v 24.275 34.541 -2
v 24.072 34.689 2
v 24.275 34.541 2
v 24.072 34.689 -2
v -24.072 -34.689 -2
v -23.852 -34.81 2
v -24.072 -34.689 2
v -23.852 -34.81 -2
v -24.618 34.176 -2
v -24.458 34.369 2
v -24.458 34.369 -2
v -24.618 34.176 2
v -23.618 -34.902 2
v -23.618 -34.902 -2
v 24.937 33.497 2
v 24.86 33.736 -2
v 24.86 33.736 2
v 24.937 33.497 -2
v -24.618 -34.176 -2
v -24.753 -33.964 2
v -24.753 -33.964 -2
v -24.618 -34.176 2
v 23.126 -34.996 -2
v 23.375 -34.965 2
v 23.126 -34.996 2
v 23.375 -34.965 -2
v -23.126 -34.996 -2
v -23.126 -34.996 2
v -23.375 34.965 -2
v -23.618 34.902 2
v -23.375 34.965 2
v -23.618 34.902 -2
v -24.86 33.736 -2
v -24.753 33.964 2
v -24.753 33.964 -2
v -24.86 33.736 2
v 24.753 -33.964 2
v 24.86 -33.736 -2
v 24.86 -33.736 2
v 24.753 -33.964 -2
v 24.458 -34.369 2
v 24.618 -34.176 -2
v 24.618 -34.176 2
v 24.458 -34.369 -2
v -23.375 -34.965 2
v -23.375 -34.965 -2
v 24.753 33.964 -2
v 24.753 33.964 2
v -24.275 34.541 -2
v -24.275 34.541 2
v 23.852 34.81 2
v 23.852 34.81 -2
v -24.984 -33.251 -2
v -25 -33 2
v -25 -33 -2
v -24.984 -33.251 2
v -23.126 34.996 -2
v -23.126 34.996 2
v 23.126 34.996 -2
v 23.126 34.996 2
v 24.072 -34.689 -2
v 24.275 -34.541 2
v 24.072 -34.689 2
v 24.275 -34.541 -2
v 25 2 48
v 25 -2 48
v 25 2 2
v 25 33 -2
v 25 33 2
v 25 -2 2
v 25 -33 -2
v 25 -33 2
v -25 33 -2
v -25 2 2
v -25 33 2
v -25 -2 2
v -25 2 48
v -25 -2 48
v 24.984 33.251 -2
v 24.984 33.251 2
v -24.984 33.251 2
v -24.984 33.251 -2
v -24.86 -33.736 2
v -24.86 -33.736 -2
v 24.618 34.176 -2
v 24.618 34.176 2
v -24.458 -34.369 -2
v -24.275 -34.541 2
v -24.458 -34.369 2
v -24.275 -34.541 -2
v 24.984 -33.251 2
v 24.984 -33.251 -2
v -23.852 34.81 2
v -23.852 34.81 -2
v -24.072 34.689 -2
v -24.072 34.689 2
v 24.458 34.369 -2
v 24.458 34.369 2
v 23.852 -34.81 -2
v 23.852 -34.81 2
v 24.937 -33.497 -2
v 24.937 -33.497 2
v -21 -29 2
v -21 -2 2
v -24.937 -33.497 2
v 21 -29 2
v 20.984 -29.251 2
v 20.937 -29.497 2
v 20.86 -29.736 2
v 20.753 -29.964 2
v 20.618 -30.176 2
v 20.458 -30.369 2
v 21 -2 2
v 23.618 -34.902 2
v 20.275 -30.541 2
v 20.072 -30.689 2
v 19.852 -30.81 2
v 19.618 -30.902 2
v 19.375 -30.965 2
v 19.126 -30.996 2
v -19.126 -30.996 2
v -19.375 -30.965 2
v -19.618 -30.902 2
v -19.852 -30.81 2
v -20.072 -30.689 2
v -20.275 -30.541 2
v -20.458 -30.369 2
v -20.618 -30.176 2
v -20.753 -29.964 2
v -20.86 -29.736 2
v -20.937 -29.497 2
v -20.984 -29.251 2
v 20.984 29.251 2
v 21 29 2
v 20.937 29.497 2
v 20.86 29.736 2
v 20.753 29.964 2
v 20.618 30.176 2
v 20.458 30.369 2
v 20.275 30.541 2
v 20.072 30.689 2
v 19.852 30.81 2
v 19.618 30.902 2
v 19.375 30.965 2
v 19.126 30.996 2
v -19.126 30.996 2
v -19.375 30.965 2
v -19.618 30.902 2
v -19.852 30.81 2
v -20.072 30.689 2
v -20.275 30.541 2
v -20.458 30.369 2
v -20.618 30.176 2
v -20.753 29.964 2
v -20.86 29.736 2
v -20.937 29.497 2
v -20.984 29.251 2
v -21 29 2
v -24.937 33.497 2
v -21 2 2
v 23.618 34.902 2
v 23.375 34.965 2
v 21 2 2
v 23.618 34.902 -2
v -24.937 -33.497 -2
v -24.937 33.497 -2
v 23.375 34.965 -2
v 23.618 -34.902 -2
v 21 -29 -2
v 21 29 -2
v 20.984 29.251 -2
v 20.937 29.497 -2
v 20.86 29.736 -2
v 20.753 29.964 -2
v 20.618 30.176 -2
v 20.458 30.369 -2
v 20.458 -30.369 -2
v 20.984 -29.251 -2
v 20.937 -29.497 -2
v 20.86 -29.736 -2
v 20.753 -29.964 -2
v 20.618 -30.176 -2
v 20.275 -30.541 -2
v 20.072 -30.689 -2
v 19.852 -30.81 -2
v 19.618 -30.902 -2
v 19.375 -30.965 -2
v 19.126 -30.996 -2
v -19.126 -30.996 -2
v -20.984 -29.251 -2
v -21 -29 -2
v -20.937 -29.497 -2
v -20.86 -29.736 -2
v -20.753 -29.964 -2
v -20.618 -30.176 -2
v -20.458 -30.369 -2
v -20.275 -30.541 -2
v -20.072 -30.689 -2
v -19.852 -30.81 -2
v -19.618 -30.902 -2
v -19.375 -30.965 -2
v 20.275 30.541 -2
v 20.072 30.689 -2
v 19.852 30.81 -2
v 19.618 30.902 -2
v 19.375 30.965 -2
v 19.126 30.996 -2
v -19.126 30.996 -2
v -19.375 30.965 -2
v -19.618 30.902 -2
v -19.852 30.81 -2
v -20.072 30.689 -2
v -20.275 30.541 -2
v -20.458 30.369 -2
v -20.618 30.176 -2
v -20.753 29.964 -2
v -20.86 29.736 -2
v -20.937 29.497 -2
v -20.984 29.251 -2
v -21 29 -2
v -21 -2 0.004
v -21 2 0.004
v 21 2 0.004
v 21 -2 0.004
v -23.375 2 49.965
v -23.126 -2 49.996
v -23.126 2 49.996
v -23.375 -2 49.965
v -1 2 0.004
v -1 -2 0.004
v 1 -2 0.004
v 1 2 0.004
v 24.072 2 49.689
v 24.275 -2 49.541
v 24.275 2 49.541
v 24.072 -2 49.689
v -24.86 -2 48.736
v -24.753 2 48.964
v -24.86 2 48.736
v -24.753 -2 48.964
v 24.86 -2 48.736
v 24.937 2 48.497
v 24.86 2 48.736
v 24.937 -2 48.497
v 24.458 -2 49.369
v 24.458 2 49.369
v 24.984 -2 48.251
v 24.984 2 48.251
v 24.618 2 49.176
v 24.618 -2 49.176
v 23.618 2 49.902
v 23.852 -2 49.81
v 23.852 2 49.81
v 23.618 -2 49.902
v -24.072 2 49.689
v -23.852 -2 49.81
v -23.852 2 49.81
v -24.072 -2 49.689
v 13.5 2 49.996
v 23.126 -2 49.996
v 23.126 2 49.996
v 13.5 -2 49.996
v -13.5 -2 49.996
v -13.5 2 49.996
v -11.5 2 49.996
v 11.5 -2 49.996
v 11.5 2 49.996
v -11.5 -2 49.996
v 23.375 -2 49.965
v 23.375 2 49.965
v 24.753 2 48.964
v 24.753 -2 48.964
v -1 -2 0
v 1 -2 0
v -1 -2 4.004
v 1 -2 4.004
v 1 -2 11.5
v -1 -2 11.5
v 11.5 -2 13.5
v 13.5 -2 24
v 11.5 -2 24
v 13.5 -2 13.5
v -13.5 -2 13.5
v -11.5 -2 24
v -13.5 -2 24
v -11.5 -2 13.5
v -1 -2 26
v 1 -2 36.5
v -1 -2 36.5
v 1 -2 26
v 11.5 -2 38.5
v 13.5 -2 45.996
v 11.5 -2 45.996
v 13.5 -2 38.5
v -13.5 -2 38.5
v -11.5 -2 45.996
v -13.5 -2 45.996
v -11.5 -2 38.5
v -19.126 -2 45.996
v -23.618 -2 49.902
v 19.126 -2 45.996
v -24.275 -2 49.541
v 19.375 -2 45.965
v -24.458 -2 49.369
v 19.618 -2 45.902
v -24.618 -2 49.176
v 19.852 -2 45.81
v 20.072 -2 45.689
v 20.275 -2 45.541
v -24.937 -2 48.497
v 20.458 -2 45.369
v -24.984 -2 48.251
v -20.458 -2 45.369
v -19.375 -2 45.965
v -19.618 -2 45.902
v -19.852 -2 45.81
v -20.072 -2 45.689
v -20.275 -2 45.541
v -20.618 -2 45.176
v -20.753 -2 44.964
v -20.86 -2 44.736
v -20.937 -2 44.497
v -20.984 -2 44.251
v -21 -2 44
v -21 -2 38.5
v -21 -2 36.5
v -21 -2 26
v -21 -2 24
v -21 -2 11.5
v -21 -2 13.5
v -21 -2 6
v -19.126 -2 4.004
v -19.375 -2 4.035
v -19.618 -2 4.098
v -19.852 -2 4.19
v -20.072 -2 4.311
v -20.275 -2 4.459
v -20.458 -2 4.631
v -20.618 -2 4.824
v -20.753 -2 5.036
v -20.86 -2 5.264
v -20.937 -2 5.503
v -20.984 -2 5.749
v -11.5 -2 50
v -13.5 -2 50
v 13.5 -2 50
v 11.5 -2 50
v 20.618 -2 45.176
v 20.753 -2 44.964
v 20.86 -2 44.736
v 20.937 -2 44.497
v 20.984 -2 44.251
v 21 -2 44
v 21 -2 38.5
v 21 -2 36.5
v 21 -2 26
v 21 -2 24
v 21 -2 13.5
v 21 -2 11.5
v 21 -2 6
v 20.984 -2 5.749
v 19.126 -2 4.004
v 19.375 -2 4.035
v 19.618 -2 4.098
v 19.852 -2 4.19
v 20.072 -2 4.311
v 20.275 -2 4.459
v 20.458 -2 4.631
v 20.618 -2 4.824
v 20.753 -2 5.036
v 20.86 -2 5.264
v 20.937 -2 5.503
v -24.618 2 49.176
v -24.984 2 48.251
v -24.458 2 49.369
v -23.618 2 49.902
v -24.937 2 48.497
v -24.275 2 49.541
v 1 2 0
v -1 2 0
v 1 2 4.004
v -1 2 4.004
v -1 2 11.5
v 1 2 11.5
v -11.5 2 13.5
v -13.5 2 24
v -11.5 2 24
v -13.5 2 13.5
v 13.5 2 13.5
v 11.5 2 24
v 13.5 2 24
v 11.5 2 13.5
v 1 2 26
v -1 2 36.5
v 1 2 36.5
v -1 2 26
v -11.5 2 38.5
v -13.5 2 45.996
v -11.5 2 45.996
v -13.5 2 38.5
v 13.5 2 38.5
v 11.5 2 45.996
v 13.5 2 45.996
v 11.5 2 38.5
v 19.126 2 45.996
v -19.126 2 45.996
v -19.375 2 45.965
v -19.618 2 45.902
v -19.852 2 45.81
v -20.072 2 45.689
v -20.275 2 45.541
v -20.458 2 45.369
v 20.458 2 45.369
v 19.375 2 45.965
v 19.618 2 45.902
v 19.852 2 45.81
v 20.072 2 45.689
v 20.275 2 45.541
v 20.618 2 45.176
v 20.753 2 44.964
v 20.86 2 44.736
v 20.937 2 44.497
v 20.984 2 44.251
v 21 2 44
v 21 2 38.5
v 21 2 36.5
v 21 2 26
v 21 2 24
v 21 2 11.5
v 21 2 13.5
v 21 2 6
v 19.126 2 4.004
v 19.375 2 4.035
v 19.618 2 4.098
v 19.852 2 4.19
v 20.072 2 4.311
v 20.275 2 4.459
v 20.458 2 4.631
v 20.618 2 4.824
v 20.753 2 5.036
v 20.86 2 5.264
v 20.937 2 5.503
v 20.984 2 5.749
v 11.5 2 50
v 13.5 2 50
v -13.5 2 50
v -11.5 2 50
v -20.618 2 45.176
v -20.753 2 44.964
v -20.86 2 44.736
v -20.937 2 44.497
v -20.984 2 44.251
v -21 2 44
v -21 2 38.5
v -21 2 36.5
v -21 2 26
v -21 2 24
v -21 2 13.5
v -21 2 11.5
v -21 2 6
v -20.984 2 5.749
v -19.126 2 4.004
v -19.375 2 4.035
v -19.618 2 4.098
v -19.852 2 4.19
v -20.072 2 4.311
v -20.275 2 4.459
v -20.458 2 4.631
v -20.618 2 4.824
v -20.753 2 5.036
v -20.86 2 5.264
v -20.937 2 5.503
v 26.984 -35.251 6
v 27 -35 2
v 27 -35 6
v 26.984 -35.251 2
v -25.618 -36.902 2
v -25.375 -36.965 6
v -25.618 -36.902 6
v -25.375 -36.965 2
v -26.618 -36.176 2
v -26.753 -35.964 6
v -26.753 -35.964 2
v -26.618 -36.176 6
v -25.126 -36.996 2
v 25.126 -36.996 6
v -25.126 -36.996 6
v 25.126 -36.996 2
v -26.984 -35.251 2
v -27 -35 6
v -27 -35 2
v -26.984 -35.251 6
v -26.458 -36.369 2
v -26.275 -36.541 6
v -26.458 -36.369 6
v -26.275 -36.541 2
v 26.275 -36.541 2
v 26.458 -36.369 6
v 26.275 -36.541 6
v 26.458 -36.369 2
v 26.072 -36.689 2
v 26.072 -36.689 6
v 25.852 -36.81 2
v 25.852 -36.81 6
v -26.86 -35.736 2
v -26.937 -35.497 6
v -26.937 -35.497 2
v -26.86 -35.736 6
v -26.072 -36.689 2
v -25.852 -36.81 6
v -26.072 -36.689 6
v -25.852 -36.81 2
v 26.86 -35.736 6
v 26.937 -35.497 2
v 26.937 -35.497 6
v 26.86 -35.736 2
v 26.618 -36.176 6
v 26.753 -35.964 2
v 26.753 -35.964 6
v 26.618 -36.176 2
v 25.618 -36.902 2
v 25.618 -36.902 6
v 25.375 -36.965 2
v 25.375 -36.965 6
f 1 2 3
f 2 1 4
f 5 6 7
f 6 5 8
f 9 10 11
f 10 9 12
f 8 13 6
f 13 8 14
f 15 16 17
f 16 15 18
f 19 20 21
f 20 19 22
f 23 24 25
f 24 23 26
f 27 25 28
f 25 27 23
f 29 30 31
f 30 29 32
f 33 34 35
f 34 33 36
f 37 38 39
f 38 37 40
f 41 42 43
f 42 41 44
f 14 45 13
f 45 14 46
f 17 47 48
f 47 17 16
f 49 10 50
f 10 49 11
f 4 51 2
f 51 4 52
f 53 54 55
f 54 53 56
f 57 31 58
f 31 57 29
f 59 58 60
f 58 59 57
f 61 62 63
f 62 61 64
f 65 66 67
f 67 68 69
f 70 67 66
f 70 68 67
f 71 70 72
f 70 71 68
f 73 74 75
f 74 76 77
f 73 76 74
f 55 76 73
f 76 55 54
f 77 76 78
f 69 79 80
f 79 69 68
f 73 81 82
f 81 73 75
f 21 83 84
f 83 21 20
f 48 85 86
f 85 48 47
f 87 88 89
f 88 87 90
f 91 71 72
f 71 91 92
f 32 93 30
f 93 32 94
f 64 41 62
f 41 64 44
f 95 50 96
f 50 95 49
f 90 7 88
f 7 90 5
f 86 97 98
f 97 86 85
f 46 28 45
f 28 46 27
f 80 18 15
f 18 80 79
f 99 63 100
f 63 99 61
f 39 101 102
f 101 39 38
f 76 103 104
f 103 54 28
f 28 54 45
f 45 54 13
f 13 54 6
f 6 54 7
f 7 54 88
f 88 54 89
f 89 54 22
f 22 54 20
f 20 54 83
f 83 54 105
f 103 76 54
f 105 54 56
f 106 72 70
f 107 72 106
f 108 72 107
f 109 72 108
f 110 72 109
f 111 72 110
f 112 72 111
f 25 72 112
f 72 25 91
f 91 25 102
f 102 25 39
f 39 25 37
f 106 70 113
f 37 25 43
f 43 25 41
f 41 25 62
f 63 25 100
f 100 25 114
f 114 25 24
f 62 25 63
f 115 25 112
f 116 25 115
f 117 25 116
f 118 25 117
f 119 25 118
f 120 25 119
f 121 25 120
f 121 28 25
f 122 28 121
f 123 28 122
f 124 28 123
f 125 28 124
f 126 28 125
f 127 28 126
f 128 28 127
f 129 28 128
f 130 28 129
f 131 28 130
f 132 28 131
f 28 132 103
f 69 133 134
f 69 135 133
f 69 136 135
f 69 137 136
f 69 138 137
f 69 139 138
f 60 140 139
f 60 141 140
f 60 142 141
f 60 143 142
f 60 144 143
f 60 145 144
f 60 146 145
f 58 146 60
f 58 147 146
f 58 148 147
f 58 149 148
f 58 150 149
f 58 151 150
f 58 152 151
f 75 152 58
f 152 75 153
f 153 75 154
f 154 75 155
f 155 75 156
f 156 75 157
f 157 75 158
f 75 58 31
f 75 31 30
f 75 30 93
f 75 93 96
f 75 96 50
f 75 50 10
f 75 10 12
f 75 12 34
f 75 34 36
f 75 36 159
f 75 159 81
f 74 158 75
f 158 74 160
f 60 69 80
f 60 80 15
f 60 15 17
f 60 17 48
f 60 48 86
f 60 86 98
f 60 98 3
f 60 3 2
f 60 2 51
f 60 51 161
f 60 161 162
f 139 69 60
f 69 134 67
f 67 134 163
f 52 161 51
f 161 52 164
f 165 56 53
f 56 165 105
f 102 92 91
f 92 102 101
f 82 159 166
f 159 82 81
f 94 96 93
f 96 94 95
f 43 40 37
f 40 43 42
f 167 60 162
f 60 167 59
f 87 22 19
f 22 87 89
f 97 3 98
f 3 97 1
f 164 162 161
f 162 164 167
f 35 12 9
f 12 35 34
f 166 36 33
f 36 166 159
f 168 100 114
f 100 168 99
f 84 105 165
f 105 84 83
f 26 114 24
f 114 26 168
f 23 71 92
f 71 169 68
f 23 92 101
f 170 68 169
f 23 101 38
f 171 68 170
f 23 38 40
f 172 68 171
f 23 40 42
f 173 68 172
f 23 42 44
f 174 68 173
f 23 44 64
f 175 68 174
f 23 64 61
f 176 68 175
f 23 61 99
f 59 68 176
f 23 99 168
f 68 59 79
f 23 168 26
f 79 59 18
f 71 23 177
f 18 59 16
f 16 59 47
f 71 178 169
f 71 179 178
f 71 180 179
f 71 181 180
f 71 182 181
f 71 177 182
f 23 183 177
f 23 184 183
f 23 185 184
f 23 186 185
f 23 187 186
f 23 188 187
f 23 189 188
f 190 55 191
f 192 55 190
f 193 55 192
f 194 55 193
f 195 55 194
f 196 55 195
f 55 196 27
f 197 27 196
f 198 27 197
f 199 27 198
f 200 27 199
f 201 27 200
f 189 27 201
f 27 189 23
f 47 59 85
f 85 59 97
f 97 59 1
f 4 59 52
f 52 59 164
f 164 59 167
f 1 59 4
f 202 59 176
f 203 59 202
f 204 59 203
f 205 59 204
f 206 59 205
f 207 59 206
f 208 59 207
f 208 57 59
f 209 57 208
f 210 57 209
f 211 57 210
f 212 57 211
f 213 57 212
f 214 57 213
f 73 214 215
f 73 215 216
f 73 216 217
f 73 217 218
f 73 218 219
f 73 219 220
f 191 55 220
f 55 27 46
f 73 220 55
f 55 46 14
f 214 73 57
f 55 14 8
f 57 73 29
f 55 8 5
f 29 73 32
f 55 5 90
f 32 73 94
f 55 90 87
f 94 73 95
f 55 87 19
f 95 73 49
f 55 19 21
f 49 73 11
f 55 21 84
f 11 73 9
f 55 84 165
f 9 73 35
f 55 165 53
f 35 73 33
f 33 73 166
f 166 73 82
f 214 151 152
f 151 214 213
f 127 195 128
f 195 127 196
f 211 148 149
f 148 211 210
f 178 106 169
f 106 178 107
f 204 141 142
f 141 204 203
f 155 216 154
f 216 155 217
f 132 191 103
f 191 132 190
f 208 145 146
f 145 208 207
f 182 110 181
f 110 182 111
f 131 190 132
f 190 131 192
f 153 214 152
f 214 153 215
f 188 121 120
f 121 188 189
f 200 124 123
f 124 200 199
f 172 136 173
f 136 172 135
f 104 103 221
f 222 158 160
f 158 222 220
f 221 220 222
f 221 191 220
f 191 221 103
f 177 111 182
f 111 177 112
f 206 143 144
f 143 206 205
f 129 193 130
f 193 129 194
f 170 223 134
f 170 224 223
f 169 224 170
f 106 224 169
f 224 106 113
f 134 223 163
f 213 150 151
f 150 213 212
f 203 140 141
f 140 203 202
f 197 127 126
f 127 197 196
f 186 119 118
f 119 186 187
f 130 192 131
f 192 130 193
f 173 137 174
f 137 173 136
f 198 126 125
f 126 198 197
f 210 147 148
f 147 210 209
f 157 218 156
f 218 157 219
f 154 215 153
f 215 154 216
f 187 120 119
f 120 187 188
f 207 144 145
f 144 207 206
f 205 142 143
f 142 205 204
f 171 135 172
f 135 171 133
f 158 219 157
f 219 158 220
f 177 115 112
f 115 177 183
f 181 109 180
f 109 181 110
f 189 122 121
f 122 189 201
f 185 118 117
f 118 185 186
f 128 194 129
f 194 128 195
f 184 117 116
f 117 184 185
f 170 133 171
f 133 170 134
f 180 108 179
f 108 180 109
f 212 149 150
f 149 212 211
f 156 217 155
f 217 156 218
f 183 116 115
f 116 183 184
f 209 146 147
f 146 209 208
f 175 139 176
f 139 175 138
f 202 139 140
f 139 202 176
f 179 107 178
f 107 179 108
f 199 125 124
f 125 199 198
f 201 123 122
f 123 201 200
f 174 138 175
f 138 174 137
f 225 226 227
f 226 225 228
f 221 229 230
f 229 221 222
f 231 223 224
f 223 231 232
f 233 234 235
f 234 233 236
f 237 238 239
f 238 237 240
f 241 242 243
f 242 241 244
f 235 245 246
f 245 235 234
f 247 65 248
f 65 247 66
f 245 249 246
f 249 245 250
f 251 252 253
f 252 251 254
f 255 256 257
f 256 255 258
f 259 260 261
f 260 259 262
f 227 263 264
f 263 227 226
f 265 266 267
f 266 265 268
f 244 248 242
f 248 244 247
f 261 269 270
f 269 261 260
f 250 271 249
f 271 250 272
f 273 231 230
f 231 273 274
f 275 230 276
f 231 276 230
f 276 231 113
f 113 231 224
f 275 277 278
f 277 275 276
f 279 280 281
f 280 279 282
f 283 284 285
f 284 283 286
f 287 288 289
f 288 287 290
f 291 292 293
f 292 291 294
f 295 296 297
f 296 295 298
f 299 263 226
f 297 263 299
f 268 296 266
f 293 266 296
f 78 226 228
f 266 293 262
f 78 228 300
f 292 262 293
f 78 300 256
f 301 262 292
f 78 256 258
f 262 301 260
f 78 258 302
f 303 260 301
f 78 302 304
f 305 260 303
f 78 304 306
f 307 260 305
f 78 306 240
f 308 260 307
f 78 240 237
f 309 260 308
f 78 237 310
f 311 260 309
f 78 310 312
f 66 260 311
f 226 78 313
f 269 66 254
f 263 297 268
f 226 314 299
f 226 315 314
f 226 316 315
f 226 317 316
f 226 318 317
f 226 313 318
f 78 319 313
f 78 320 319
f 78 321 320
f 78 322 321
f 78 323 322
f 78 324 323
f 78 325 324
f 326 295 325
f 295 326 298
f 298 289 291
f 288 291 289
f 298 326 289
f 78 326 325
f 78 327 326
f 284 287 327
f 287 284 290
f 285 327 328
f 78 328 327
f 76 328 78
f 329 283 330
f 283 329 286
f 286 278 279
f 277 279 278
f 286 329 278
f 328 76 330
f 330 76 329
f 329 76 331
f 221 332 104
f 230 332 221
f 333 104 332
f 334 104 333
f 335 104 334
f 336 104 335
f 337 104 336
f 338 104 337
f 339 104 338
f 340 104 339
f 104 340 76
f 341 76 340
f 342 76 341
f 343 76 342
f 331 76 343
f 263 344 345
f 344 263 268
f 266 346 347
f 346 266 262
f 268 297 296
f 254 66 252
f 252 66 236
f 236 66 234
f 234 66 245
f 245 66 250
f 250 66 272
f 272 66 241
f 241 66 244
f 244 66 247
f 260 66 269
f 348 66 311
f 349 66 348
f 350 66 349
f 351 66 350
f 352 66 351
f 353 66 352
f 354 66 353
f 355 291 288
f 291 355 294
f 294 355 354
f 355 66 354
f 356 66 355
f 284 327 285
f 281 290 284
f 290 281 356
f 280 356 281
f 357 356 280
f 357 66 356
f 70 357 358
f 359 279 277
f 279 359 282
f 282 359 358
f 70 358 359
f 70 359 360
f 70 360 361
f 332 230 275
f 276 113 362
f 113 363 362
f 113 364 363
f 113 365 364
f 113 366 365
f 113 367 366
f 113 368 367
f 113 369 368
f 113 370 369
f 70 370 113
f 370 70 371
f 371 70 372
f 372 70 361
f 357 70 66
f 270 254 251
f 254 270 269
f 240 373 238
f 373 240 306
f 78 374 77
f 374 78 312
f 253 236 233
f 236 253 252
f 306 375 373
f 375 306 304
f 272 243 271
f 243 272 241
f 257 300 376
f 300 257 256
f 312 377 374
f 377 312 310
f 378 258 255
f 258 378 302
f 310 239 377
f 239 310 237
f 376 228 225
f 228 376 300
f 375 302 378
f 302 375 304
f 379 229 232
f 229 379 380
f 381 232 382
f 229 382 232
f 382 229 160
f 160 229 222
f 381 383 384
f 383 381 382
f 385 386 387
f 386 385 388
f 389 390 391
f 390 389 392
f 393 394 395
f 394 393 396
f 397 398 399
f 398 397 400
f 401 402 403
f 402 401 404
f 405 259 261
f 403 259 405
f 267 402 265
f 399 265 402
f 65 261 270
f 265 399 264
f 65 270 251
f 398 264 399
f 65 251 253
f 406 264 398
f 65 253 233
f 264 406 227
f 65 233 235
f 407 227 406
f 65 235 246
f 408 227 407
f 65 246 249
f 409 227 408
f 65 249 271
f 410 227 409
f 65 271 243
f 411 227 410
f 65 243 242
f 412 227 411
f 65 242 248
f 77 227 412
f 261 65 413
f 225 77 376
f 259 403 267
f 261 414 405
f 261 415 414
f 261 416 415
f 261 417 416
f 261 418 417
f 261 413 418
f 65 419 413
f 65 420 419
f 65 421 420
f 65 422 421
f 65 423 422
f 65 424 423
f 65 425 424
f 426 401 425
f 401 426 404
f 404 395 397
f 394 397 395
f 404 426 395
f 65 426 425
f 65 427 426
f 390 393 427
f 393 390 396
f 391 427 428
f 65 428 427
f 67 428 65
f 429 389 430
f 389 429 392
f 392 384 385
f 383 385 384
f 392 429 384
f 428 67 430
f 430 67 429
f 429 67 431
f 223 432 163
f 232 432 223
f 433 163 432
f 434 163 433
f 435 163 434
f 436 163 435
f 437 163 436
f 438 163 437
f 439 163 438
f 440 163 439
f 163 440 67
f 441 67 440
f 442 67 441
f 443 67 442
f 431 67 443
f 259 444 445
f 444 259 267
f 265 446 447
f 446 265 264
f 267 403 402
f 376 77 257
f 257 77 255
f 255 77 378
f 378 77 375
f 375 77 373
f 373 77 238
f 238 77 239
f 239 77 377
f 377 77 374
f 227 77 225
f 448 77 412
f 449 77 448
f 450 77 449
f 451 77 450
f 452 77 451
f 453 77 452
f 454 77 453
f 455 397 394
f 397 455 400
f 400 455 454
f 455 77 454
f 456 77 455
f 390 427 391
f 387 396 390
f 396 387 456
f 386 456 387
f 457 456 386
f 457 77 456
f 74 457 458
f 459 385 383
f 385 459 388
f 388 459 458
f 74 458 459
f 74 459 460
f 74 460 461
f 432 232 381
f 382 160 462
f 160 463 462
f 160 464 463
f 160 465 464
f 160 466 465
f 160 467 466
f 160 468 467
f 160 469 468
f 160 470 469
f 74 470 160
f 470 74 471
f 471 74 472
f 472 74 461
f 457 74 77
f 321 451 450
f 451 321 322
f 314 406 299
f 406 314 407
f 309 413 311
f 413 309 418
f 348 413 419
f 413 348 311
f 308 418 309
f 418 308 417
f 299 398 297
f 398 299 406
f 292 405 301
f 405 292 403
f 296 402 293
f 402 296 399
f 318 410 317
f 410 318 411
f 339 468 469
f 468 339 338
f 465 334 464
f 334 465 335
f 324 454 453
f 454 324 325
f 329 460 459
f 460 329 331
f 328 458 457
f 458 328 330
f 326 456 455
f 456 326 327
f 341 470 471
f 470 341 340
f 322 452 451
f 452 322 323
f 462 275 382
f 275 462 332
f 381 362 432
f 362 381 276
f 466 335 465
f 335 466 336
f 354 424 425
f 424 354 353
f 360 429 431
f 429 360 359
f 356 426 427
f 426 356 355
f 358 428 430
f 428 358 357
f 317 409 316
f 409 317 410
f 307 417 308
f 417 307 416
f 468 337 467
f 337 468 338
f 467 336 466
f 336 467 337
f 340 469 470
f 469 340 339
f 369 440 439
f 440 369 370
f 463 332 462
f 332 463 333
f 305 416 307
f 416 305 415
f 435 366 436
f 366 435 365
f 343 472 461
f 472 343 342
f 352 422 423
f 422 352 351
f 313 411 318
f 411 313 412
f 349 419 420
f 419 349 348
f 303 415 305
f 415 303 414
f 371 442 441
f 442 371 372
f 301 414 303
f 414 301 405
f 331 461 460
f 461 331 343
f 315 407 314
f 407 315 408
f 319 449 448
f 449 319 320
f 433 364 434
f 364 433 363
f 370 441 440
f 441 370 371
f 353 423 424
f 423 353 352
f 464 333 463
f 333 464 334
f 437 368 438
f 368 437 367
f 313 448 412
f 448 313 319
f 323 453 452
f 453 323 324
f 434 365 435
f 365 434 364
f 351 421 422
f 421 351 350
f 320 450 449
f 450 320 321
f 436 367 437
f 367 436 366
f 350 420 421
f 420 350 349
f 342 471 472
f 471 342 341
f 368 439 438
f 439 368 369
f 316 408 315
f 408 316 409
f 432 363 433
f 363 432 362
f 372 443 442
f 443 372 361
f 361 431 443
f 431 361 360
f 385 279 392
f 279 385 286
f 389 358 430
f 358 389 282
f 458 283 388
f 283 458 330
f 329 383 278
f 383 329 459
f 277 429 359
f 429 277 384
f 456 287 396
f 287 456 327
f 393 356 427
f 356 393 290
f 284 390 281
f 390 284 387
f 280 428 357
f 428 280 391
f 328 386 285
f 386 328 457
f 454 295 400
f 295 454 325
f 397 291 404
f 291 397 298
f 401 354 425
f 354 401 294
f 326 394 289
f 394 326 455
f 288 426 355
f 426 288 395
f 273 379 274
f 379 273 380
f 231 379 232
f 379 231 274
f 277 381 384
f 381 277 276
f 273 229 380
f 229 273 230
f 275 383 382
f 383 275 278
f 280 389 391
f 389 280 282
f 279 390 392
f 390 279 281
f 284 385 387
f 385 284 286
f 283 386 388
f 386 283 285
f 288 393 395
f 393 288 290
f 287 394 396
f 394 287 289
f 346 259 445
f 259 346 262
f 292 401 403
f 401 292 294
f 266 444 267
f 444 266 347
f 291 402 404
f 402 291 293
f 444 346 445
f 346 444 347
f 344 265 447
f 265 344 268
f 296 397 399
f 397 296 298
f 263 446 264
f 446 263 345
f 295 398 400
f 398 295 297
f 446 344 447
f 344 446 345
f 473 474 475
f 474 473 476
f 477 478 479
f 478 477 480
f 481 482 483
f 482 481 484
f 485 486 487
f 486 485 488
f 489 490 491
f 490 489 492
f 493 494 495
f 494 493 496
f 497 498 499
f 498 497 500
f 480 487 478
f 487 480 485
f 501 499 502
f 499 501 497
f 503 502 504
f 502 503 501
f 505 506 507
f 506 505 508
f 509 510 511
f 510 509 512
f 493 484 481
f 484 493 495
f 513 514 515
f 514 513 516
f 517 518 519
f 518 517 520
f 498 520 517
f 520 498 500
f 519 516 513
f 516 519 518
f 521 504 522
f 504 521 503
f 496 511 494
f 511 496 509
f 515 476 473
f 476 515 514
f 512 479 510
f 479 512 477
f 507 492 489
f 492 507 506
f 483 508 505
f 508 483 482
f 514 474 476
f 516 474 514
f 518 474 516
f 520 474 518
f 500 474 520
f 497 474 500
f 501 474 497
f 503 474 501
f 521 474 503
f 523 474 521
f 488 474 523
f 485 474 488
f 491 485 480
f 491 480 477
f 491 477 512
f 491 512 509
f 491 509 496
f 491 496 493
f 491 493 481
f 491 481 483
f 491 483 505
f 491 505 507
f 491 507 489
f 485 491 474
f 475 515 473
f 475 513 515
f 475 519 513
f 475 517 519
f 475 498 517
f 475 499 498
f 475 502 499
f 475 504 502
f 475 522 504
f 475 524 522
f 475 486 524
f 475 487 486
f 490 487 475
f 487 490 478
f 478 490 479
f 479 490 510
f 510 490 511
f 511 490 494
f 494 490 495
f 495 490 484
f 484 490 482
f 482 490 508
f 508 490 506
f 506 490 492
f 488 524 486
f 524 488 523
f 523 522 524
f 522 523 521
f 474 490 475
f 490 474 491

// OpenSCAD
// file: utils.scad
// Cube with rounded corners
// roundedCornerCube (50,50,4);
module roundedCornerCube(length, width, thickness){

        hull()
        {
            translate([length/2 - 2, width/2 - 2, 0]) cylinder(r=2, h=thickness, $fn=50, center=true);
            translate([length/2 - 2, -width/2 + 2, 0]) cylinder(r=2, h=thickness, $fn=50, center=true);
            translate([-length/2 + 2, width/2 - 2, 0]) cylinder(r=2, h=thickness, $fn=50, center=true);
            translate([-length/2 + 2, -width/2 + 2, 0]) cylinder(r=2, h=thickness, $fn=50, center=true);
        }

}

// Hollow cube with rounded corners. Will look like a frame with rounded con
// hollowRoundedCornerCube(50,70,4,2);
module hollowRoundedCornerCube(length, width, thickness, wallthickness)
{
    difference()
    {
        roundedCornerCube(length,width,thickness);
        roundedCornerCube(length-(wallthickness*2),width-(wallthickness*2),thickness);
    }
}

/*
module cylinderWithHandle(radius, thickness)
{
    rotate_extrude($fn=100)
        polygon( points = [[0,0], [radius,0], [radius,thickness] , [1,thickness], [2,thickness + 2] , [2,thickness + 6],[0,thickness + 6]] );
}
*/


// hollow cylinder
// hollowCylinder(radius, height, wallThickness)
// radius : radius to outter wall
// wallThickness : Thickness of wall
module hollowCylinder(radius, height, wallThickness)
{

    difference()
    {
        cylinder(h=height, r1=radius, r2=radius);
        translate([0,0,-.02]) cylinder(h=height + .04, r1=radius - wallThickness, r2=radius - wallThickness);
    }
}


// hollow cylinders
// hollowCylinders(20, 10, 2, 2, 2)
// radius : radius to outer wall
// gapsSize : size of gap between each rings
// minradius : radius of the smallest ring
module hollowCylinders(radius, height, wallThickness, gapSize, minRadius)
{
    for (i = [radius : -(gapSize + wallThickness) : minRadius])
    {
       //echo (i);
       hollowCylinder(i,height,wallThickness);
    }
}

//
// b = bottom diameter
// t = top diameter
// h = height
module cone(b, t, h)
{
    cylinder(h=h, r1=b/2, r2=t/2, $fn=100);
}

// hollowCone(10,4,20, 2)
module hollowCone(bottomRadius, topRadius, height, wallThickness)
{
    difference()
    {
        cylinder(h=height, r1=bottomRadius, r2=topRadius, $fn=100);
        translate([0,0,-.02]) cylinder(h=height, r1=bottomRadius - wallThickness, r2=topRadius - wallThickness, $fn=100);
    }
}


// w = width between flat surface
// h = height
module hex (w=10, h=2){
  cylinder (r=w/2, h=h, center=true, $fn=6);
}

// hollowCone(10,4,20, 2)
module hollowHex(w=10, h=2, th=2)
{
    difference()
    {
        cylinder (r=w/2, h=h, center=true, $fn=6);
        cylinder (r=w/2 - th, h=h, center=true, $fn=6);
    }
}

// h : height
// ns : number of sides for base
// br : bottom radius
// tr : top radius
// ro : rotation in degree between bottom and top
// sl : slice layer. high value give smooth appearence
module twistExtrude(h=50,ns=6,br=20,tr=20,ro=100,sl=5)
{

	linear_extrude(height = h, twist  = ro,	slices = sl, scale  = tr/br)
		circle(r=br, $fn=ns);
}


// h : height
// ns : number of sides for base
// br : bottom radius
// tr : top radius
// ro : rotation in degree between bottom and top
// sl : slice layer. high value give smooth appearence
// wt : wall thickness
module hollowTwistExtrude(h=50,ns=6,br=20,tr=20,ro=100,sl=5,wt=1)
{
	difference()
	{
		linear_extrude(height = h, twist  = ro,	slices = sl, scale  = tr/br)
			circle(r=br, $fn=ns);

    translate([0,0,-.01])
		linear_extrude(height = h + .1, twist  = ro,	slices = sl, scale  = tr/br)
			circle(r=br - wt, $fn=ns);
	}
}


///////////////////////////////////////////////////////////////////////////////////////////////////////////////////

// honeycomb tiles
// honeycombSquare(100,100,4,10,2);
module honeycombTiles(length, width,thickness,rad,wallThickness)
{
    //thickness = 4;
    //rad = 10;
    //wallThickness = 2;
    //length = 100;
    //width = 100;

    for (w=[0: width/rad])
    {

        if (w % 2 == 0)
        {
            //cylinder($fn=6, r=rad, h=2);
            for (i = [0 : length/((rad*2) + (wallThickness*2))])
            {
              translate([rad*(3*i) + (wallThickness*2)*i,w*rad,0]) cylinder($fn=6, r=rad, h=thickness);

              //translate([rad*6 + (wallThickness*2)*2,0,0]) cylinder($fn=6, r=10, h=2);
              //translate([rad*9 + (wallThickness*2)*3,0,0]) cylinder($fn=6, r=10, h=2);
            }
        }

        if (w % 2 == 1)
        {
            for (j = [1 : 2 : (length/(rad + wallThickness))])
            {
              translate([(rad*1.5) *j + wallThickness *j , (w*rad) + wallThickness/2 ,0])  cylinder($fn=6, r=rad, h=thickness);
                //translate([(rad*1.5) *3 + wallThickness *3 ,10,0]) circle($fn=6, r=10);
                //translate([(rad*1.5) *5 + wallThickness *5 ,10,0]) circle($fn=6, r=10);
            }
        }
    }
}

// honeycomb square
// A square area with hollow honeycomb design
// honeycombSquare(100,100,4,10,2);
module honeycombSquare(length, width, thickness, cellRad,wallThickness)
{
    difference()
    {
        cube([length,width,thickness], center=true);
        translate([-length/2,-width/2, -thickness/2]) honeycombTiles(length,width,thickness,cellRad,wallThickness);
    }
}

//honeycomb(length, width, height, cell_size, wall_thickness);
//honeycomb(50, 50, 4, 10, 1);
//hollowRoundedCornerCube(50,70,4,2);

//hollowCylinder(10,20,2);

//hollowCylinders(20, 10, 2, 2, 2);
//cone(10,2,20);

// hollowCone(10,4,20, 2);

// honeycombSquare(40,40,2,5,2);


module edgeClamp(l=10)
{
   difference()
   {
    translate([0,.6,0]) rotate([45,0,0]) cube([l,2,2], center=true);
    translate([0,.6,1.5]) cube([l + .1,1,1], center=true);
    translate([0,.6,-1.5]) cube([l + .1,1,1], center=true);
   }
   cube([l,2,2], center=true);
}

cube([10,2,2], center=true);
translate([0,0,2]) edgeClamp();
// main file
// Simple phone stand

use <utils.scad> 

l = 50;
w = 70; // width of the base (l x w = area of the base)
h = 50; // Height of the back support 
th = 4; // thickness
eb = true; // extend base to back to prevent tip over. Not required if phone is placed only on the side (watch videos etc.) on the stand

// base of the stand
module base()
{
    hollowRoundedCornerCube(l,w,th,th);
}

// vertical back of the stand
module backside()
{

    translate([0,0,h/2])
        rotate ([90,0,0])
            hollowRoundedCornerCube(l,h,th,th);


        // horizontal rows
        translate([0,0,50/4]) cube ([50,4,2], center=true);   
        translate([0,0,(50/4 + 50/4)]) cube ([50,4,2], center=true);   
        translate([0,0,(50/4 + (50/4 * 2))]) cube ([50,4,2], center=true);   

        // vertical supports
        translate([0,0,(50/4)/2]) rotate([0,90,0]) cube ([50/4,4,2], center=true);
        
        translate([50/4,0,(50/4 + 50/4) - (50/4)/2]) rotate([0,90,0]) cube ([50/4,4,2], center=true);
        translate([-50/4,0,(50/4 + 50/4) - (50/4)/2]) rotate([0,90,0]) cube ([50/4,4,2], center=true);

        translate([0,0,(50/4 + (50/4 * 2)) - (50/4)/2]) rotate([0,90,0]) cube ([50/4,4,2], center=true);

        translate([50/4,0,(50/4 + (50/4 * 2)) + (50/4)/2]) rotate([0,90,0]) cube ([50/4,4,2], center=true);
        translate([-50/4,0,(50/4 + (50/4 * 2)) + (50/4)/2]) rotate([0,90,0]) cube ([50/4,4,2], center=true);

}  


//end stop
module endstop()
{
    difference()
    {
        hull()
        {
            translate([l/2,-w/2,th]) cylinder(r=2, h=4, $fn=50, center=true);
            translate([-l/2,-w/2,th]) cylinder(r=2, h=4, $fn=50, center=true);
        }
        
        translate([0,-w/2 + 1,th]) cube([l+th,th/2,th], center=true);
    }
}


/*
module roundedCornerCube(length, width, thickness){

       hull()
        {
            translate([length/2, width/2, 0]) cylinder(r=2, h=thickness, $fn=50, center=true);
            translate([length/2, -width/2, 0]) cylinder(r=2, h=thickness, $fn=50, center=true);
            translate([-length/2, width/2, 0]) cylinder(r=2, h=thickness, $fn=50, center=true);
            translate([-length/2, -width/2, 0]) cylinder(r=2, h=thickness, $fn=50, center=true);
        }

}
*/

base();
backside();
endstop();
